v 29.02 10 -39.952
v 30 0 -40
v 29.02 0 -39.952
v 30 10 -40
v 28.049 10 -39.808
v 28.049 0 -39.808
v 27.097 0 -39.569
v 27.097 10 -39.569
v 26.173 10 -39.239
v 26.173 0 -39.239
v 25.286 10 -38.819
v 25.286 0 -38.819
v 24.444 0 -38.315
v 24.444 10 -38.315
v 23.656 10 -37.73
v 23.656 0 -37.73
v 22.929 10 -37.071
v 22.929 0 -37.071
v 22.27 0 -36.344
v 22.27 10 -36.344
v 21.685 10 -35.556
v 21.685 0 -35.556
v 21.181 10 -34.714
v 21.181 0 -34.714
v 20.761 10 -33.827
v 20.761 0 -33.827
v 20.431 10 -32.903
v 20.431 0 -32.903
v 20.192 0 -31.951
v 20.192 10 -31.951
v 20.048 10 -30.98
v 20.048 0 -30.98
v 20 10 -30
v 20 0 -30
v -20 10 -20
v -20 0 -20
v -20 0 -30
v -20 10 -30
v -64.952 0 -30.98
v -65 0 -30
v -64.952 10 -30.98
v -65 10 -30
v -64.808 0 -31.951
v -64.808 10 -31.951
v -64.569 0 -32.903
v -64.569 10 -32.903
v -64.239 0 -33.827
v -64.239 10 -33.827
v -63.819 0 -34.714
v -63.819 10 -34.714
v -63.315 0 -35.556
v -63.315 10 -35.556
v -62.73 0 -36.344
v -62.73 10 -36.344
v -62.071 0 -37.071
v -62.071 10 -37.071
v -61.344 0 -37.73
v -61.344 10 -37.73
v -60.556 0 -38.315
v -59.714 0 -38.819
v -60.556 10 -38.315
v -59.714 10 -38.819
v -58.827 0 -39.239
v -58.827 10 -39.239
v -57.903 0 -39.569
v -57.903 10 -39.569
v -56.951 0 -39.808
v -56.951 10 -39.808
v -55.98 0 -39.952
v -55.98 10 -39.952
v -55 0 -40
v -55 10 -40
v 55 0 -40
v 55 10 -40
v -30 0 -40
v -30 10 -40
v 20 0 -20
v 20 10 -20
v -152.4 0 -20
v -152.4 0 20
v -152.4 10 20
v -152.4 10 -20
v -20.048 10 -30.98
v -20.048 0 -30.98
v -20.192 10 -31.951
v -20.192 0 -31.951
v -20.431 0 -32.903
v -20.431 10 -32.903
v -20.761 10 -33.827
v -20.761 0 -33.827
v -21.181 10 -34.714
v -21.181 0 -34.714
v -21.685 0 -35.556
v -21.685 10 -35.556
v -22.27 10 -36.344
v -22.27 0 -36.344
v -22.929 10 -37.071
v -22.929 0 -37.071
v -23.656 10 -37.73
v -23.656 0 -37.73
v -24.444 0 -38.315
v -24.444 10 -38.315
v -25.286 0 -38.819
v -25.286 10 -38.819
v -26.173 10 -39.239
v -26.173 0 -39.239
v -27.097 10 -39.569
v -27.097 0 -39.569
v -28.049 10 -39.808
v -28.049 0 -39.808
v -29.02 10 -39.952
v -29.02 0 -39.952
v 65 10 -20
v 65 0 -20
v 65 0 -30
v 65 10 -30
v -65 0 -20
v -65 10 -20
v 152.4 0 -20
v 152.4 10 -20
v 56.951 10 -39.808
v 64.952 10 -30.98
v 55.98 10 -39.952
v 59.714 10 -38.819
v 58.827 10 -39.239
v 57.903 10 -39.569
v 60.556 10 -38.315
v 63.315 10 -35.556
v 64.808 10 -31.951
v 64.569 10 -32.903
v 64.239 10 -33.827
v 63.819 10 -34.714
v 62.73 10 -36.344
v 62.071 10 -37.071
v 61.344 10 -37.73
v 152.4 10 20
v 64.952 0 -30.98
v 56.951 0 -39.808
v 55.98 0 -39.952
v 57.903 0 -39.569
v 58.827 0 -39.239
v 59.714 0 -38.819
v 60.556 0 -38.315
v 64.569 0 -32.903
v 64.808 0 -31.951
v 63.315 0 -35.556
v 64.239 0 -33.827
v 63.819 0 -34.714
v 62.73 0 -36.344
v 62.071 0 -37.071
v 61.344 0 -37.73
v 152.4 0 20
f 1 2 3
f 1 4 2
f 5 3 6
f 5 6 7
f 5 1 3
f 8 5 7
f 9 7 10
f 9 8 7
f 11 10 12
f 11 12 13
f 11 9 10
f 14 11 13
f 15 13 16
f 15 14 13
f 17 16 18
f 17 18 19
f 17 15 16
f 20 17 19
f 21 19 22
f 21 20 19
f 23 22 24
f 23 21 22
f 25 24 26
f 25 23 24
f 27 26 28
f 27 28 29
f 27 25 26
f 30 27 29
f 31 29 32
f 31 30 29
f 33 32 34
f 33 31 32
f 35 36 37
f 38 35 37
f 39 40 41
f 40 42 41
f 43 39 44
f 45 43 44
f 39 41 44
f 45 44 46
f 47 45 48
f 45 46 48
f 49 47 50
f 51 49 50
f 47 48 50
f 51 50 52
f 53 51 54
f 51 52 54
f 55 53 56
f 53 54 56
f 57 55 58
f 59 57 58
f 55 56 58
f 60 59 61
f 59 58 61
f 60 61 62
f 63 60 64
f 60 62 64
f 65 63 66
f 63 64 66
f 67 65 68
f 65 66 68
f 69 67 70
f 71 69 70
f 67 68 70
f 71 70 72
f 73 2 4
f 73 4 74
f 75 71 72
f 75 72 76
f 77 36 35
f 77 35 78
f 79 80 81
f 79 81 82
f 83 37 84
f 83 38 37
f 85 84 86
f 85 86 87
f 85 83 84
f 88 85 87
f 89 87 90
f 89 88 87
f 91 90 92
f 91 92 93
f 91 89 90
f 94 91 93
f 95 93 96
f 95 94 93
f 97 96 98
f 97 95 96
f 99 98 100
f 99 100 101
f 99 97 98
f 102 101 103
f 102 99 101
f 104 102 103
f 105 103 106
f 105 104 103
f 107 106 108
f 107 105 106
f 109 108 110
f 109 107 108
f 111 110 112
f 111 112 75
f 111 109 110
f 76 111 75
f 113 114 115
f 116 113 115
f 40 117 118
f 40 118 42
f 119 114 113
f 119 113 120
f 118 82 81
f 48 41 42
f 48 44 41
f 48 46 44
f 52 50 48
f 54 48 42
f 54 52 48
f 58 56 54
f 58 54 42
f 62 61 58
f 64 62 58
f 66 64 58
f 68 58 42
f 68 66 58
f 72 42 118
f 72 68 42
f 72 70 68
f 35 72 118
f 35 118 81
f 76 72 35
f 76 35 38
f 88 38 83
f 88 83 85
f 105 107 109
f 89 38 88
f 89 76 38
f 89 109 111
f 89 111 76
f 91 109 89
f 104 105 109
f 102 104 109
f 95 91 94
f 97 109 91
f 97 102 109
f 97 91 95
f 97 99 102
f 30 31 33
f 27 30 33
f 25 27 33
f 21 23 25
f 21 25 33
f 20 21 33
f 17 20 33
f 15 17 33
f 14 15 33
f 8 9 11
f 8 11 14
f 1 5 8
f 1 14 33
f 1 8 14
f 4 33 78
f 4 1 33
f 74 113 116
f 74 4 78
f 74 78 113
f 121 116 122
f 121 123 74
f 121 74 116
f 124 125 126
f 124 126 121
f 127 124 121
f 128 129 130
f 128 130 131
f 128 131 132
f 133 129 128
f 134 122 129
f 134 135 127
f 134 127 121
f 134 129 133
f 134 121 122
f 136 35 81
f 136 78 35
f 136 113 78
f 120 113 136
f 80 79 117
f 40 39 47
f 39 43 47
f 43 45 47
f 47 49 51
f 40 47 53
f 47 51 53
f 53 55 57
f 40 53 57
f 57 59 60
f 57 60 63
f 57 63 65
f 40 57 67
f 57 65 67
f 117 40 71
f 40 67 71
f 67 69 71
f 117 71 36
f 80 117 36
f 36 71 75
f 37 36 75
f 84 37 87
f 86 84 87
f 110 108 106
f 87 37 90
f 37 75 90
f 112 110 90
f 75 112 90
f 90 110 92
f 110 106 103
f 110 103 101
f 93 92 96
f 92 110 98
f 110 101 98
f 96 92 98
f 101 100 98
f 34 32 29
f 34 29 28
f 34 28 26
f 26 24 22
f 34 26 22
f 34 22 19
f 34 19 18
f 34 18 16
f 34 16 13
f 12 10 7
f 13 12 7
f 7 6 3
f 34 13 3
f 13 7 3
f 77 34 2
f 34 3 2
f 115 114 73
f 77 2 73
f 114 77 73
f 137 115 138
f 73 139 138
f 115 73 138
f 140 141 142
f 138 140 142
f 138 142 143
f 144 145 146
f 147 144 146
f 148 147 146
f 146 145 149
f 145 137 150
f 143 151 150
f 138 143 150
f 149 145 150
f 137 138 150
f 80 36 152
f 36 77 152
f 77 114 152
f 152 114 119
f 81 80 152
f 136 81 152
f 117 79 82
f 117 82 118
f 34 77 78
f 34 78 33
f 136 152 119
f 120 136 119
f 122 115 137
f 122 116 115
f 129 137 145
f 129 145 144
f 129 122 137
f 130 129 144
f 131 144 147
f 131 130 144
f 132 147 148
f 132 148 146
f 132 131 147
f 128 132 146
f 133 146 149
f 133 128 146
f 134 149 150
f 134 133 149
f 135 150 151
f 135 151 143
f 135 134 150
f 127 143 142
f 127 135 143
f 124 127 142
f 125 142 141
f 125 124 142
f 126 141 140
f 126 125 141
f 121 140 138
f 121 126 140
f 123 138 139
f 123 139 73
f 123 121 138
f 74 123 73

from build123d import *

# Parameters (mm, degrees)
SKETCH1_W           = 45
SKETCH1_H           = 20
SKETCH1_W_2         = 304.8
SKETCH1_H_2         = 40
BOSS_EXTRUDE1_DEPTH = 10
FILLET1_R           = 10


with BuildPart() as part:
    # Sketch1 → Boss-Extrude1 (new body)
    with BuildSketch(Plane(origin=(0, 0, 0), x_dir=(1, 0, 0), z_dir=(0, 1, 0))):
        with Locations((-42.5, 30)):
            Rectangle(SKETCH1_W, SKETCH1_H)
        with Locations((42.5, 30)):
            Rectangle(SKETCH1_W, SKETCH1_H)
        Rectangle(SKETCH1_W_2, SKETCH1_H_2)
    extrude(amount=BOSS_EXTRUDE1_DEPTH)

    # Fillet1
    fillet1_edges = [part.edges().sort_by_distance(p)[0] for p in [
        (-20, 5, -40),
        (20, 5, -40),
        (65, 5, -40),
        (-65, 5, -40),
    ]]
    fillet(fillet1_edges, radius=FILLET1_R)


solid = part.part
